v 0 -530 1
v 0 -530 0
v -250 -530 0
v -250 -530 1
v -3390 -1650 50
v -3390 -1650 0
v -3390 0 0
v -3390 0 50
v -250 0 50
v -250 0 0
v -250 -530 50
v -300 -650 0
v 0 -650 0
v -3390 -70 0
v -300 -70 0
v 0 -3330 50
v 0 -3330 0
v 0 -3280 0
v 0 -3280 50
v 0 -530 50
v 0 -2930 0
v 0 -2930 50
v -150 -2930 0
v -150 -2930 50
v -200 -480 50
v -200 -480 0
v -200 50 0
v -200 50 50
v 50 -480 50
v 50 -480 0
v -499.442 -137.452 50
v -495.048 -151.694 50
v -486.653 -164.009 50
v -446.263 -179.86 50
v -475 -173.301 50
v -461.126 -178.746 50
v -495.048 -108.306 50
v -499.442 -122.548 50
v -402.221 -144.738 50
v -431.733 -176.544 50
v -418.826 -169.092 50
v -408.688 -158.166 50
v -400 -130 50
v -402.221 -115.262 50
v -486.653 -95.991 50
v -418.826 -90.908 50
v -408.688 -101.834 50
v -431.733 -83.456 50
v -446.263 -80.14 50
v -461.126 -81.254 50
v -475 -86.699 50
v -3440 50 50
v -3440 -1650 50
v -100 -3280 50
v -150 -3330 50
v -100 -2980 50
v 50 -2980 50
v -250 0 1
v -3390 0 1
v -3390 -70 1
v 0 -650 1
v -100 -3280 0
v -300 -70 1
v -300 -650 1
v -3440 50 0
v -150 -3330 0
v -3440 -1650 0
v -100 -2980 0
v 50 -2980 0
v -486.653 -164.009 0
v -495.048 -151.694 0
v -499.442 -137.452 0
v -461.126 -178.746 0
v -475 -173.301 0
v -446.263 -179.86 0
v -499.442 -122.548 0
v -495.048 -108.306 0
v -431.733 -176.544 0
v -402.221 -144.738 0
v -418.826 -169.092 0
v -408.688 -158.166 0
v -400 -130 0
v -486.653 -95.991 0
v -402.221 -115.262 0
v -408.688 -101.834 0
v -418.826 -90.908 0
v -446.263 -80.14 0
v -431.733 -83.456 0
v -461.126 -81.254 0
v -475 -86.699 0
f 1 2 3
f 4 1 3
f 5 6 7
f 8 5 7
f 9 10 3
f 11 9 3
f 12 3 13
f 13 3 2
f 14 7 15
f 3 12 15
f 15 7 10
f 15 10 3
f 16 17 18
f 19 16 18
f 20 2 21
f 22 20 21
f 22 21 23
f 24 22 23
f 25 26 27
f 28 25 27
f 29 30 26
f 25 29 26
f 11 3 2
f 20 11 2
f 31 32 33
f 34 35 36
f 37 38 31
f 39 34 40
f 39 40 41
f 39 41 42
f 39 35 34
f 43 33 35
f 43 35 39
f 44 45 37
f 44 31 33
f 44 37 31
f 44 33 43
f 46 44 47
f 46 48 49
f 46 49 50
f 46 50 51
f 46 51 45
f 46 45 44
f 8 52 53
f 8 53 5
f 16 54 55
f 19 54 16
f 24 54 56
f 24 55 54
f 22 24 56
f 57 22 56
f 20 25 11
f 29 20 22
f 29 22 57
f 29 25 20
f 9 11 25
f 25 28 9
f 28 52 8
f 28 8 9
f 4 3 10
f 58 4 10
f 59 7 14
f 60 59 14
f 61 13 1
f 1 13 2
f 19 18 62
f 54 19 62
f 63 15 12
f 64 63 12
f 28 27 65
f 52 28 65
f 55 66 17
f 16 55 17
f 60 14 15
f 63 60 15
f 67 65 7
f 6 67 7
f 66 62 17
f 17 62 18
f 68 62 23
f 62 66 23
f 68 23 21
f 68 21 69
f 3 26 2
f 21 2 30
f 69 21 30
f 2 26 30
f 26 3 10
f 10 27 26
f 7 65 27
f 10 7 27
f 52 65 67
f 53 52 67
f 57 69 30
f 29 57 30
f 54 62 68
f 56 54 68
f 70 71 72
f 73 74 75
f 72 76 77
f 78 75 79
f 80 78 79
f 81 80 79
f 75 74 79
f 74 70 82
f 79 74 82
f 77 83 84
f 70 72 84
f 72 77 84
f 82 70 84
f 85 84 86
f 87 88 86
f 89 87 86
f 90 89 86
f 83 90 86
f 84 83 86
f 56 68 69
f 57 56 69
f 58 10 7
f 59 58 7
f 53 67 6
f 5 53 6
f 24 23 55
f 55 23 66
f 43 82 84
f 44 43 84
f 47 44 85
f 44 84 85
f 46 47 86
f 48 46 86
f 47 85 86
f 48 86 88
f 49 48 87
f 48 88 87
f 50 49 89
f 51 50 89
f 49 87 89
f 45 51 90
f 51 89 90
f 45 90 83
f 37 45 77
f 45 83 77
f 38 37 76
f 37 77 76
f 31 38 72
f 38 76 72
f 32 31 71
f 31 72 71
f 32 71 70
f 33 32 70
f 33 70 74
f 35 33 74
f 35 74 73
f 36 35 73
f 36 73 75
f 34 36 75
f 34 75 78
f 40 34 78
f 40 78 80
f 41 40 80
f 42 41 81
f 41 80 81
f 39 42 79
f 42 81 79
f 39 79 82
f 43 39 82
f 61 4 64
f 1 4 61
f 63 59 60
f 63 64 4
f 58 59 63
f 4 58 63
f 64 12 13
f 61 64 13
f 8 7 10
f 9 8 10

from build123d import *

# Parameters (mm, degrees)
F1_R     = 50
F2_DEPTH = 50
F4_DEPTH = 1


with BuildPart() as f2:
    # F1 (on Top) → F2 (new body)
    with BuildSketch(Plane.XY):
        Polygon((-3390, -1650), (-3390, 0), (-250, 0), (-250, -530), (0, -530), (0, -2930), (-150, -2930), (-150, -3330), (0, -3330), (0, -3280), (-100, -3280), (-100, -2980), (50, -2980), (50, -480), (-200, -480), (-200, 50), (-3440, 50), (-3440, -1650), align=None)
        with Locations((-450, -130)):
            Circle(F1_R)
    extrude(amount=F2_DEPTH)


with BuildPart() as f4:
    # F3 (on Top) → F4 (new body)
    with BuildSketch(Plane.XY):
        Polygon((-3390, 0), (-3390, -70), (-300, -70), (-300, -650), (0, -650), (0, -530), (-250, -530), (-250, 0), align=None)
    extrude(amount=F4_DEPTH)


solid = Compound([f2.part, f4.part])
